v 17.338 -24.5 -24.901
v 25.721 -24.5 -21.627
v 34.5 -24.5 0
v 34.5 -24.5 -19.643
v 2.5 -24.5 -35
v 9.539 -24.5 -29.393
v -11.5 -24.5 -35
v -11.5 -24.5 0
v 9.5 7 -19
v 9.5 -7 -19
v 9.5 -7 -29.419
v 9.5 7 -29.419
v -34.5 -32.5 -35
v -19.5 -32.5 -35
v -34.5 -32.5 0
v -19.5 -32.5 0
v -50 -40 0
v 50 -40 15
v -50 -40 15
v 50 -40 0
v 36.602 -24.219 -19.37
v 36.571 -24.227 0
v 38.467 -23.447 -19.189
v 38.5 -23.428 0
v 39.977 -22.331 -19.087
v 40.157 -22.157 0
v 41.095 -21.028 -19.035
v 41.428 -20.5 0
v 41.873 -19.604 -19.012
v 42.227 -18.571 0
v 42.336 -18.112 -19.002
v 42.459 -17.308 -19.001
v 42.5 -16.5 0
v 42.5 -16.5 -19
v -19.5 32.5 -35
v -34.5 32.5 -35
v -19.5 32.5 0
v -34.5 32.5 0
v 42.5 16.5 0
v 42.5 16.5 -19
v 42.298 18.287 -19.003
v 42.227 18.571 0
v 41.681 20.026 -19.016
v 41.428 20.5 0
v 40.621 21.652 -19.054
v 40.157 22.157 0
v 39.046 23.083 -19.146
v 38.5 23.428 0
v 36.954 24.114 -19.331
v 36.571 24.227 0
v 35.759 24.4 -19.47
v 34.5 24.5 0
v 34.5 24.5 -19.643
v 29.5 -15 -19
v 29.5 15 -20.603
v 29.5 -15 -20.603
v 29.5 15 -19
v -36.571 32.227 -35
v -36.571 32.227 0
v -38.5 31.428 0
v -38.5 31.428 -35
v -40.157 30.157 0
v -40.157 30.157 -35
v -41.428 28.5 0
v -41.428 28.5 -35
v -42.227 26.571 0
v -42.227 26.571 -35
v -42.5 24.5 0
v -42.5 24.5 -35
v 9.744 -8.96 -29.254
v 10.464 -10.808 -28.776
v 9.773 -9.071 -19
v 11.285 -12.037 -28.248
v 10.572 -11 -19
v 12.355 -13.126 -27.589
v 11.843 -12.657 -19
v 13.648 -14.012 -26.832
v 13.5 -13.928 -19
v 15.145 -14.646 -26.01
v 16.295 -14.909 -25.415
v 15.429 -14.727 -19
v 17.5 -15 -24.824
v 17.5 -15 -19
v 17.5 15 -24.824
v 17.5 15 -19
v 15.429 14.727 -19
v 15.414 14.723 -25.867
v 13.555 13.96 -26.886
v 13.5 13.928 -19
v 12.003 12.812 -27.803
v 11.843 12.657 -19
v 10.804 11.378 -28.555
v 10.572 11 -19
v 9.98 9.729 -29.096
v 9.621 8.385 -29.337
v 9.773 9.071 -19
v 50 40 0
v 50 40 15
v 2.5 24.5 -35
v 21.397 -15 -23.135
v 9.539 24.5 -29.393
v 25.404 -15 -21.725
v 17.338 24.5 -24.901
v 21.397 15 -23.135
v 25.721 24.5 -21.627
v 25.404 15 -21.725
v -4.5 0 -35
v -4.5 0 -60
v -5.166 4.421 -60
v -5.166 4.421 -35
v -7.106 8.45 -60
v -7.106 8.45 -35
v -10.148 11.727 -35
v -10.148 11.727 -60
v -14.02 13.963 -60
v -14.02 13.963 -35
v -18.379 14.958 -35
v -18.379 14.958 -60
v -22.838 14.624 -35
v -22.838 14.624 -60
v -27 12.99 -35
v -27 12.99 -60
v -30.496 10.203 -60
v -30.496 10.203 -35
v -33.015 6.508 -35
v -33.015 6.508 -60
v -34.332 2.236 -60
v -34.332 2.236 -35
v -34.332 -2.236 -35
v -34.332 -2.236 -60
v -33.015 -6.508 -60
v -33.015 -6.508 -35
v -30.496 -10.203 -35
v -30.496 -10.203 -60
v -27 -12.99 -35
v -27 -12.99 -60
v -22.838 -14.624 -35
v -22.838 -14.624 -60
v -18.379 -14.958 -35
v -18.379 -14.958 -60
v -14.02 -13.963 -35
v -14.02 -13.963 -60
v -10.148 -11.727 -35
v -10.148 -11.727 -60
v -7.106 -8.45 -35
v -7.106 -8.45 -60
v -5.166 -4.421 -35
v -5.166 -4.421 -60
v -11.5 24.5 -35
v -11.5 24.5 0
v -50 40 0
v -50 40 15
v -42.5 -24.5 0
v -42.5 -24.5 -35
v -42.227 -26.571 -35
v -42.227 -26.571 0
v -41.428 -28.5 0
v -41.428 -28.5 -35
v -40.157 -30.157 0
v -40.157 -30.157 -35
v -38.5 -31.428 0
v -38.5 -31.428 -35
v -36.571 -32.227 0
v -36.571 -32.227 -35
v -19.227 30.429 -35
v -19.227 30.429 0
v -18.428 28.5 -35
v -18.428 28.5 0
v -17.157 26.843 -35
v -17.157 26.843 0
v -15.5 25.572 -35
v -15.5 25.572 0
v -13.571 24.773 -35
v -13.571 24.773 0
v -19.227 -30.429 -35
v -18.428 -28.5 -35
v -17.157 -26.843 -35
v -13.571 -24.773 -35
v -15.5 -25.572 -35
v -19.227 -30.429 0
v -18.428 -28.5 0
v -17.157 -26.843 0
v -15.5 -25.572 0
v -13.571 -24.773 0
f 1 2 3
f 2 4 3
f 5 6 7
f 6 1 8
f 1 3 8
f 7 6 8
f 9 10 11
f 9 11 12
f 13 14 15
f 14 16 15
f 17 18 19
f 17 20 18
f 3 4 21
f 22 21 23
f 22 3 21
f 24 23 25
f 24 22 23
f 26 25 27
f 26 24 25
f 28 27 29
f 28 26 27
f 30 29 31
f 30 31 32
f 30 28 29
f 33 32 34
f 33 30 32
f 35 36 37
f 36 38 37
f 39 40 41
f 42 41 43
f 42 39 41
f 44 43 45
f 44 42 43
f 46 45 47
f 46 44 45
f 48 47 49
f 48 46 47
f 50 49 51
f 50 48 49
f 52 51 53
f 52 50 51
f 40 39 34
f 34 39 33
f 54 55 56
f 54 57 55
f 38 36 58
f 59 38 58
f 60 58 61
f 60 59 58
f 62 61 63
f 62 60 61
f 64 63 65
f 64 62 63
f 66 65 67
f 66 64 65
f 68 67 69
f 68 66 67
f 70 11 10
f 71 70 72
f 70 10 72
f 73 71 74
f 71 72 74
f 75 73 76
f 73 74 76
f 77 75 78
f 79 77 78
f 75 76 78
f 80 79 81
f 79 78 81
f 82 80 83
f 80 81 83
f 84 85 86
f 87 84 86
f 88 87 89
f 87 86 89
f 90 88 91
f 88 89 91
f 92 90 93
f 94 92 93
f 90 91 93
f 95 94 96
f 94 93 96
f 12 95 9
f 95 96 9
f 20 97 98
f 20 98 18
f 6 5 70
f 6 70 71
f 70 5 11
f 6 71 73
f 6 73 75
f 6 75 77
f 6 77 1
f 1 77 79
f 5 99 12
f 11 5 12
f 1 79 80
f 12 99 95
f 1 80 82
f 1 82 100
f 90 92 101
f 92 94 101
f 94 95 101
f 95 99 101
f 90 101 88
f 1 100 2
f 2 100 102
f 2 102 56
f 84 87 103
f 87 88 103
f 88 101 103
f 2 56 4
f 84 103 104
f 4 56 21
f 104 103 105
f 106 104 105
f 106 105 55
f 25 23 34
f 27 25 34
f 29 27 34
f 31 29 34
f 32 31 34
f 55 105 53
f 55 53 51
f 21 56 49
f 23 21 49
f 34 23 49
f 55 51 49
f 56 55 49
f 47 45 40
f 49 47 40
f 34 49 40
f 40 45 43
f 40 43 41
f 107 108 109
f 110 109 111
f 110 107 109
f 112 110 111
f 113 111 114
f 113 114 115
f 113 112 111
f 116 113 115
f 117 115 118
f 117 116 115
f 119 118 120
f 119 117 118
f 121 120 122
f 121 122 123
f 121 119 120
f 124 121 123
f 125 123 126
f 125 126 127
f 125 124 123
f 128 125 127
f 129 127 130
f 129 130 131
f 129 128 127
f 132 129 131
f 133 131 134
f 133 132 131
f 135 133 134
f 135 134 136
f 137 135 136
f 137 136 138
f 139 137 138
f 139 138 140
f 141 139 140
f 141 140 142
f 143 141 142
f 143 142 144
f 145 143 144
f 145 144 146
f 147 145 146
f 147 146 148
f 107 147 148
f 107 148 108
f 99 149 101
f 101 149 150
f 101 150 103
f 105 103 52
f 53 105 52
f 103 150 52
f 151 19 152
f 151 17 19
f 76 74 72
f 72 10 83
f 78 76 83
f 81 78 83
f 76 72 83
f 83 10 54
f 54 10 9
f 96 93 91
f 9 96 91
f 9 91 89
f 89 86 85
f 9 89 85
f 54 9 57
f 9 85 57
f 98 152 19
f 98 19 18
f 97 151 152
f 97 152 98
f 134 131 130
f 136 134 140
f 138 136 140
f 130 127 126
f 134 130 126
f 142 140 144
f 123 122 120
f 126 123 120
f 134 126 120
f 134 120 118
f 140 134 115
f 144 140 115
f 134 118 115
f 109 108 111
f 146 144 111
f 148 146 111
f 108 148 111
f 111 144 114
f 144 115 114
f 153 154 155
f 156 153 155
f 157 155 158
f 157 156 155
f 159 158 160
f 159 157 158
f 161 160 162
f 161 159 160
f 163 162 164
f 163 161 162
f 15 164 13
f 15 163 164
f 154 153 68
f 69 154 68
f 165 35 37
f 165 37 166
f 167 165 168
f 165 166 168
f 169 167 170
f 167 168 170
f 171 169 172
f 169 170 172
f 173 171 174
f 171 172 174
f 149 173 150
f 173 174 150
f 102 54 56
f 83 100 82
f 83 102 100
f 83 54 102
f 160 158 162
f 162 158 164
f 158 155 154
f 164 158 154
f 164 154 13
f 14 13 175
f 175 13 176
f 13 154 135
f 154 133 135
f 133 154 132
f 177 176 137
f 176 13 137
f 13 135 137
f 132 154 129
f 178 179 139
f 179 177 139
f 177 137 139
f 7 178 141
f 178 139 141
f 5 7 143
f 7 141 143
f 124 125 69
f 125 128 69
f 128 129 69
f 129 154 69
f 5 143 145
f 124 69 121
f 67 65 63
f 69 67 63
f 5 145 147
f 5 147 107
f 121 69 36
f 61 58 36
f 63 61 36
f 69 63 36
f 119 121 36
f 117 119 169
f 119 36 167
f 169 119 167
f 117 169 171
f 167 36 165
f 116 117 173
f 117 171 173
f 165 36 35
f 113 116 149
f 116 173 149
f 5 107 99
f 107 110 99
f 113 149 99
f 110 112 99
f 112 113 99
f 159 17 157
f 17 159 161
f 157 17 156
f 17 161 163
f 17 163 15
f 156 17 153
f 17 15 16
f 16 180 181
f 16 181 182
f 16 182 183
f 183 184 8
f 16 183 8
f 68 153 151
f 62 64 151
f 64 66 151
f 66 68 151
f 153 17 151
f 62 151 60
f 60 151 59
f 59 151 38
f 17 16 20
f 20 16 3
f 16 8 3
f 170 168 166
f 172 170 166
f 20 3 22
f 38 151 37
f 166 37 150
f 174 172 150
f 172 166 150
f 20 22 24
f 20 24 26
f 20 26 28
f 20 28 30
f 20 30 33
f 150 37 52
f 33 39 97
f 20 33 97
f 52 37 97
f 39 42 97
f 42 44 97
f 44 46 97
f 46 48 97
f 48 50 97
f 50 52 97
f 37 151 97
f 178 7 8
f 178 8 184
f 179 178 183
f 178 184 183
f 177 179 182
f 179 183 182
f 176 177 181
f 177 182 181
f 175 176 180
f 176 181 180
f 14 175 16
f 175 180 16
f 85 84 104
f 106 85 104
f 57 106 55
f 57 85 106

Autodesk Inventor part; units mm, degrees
ref_plane "YZ Plane" through (0, 0, 0) normal (1, 0, 0) x (0, 1, 0)
ref_plane "XZ Plane" through (0, 0, 0) normal (0, 1, 0) x (-1, 0, 0)
ref_plane "XY Plane" through (0, 0, 0) normal (0, 0, 1) x (1, 0, 0)
sketch "Sketch1" plane through (0, 0, 0) normal (0, 0, 1) x (1, 0, 0)
  line L0 (-50, 40) -> (50, 40)
  line L1 (50, 40) -> (50, -40)
  line L2 (50, -40) -> (-50, -40)
  line L3 (-50, -40) -> (-50, 40)
  line L4 (-50, 40) -> (50, -40) construction
  line L5 (50, 40) -> (-50, -40) construction
  line L6 (-34.5, 32.5) -> (-19.5, 32.5)
  line L7 (-19.5, -32.5) -> (-34.5, -32.5)
  line L8 (-42.5, -24.5) -> (-42.5, 24.5)
  line L9 (-42.5, 32.5) -> (-19.5, -32.5) construction
  line L10 (-19.5, 32.5) -> (-42.5, -32.5) construction
  arc A0 (-34.5, 32.5) -> (-42.5, 24.5) centre (-34.5, 24.5) ccw
  arc A1 (-42.5, -24.5) -> (-34.5, -32.5) centre (-34.5, -24.5) ccw
  line L11 (-11.5, 24.5) -> (34.5, 24.5)
  line L12 (42.5, 16.5) -> (42.5, -16.5)
  line L13 (34.5, -24.5) -> (-11.5, -24.5)
  line L14 (-19.5, 24.5) -> (42.5, -24.5) construction
  line L15 (42.5, 24.5) -> (-19.5, -24.5) construction
  arc A2 (42.5, 16.5) -> (34.5, 24.5) centre (34.5, 16.5) ccw
  arc A3 (34.5, -24.5) -> (42.5, -16.5) centre (34.5, -16.5) ccw
  arc A4 (-19.5, 32.5) -> (-11.5, 24.5) centre (-11.5, 32.5) ccw
  arc A5 (-11.5, -24.5) -> (-19.5, -32.5) centre (-11.5, -32.5) ccw
  circle A6 centre (-19.5, 0) radius 15
  line L16 (17.5, 15) -> (29.5, 15)
  line L17 (29.5, 15) -> (29.5, -15)
  line L18 (29.5, -15) -> (17.5, -15)
  line L19 (9.5, -7) -> (9.5, 7)
  line L20 (9.5, 15) -> (29.5, -15) construction
  line L21 (29.5, 15) -> (9.5, -15) construction
  arc A7 (17.5, 15) -> (9.5, 7) centre (17.5, 7) ccw
  arc A8 (9.5, -7) -> (17.5, -15) centre (17.5, -7) ccw
  point P0 (0, 0)
  point P1 (-31, 0)
  point P2 (11.5, 0)
  point P3 (19.5, 0)
  dimension "d0" = 100
  dimension "d1" = 80
  dimension "d2" = 23
  dimension "d3" = 65
  dimension "d4" = 8
  dimension "d5" = 8
  dimension "d6" = 7.5
  dimension "d7" = 62
  dimension "d8" = 49
  dimension "d9" = 7.5
  dimension "d10" = 8
  dimension "d13" = 30
  dimension "d14" = 23
  dimension "d15" = 20
  dimension "d16" = 30
  dimension "d17" = 13
  dimension "d18" = 8
  dimension "d32" = 8
  dimension "d34" = 46
  dimension "d35" = 8
extrude "Extrusion1" add sketch "Sketch1" along normal blind 15 contours L0 L1 L2 L3 | L6 A4 L11 A2 L12 A3 L13 A5 L7 A1 L8 A0 | A6 | L16 L17 L18 A8 L19 A7
extrude "Extrusion2" add sketch "Sketch1" against normal blind 60 contours A6
extrude "Extrusion3" add sketch "Sketch1" against normal blind 35 contours L6 A4 L11 A2 L12 A3 L13 A5 L7 A1 L8 A0
extrude "Extrusion4" add sketch "Sketch1" against normal blind 19 contours L16 L17 L18 A8 L19 A7
sketch "Sketch2" plane through (-11.5, 24.5, 0) normal (0, 1, 0) x (1, 0, 0)
  circle A0 centre (54.7979, 78.9947) radius 60
  line L0 (46, 0) -> (54, 0) projected
  line L1 (54, 0) -> (54, 19)
  line L2 (54, 0) -> (54, 35) projected
  line L3 (54, 35) -> (14, 35)
  line L4 (0, 35) -> (46, 35) projected
  point P0 (11.5, 0)
  dimension "d27" = 120
  dimension "d28" = 19
  dimension "d29" = 40
extrude "Extrusion5" cut sketch "Sketch2" against normal blind 60 contours L3 L2 A0 picked at (26.9594, 33.1676)
properties part number "P2"
